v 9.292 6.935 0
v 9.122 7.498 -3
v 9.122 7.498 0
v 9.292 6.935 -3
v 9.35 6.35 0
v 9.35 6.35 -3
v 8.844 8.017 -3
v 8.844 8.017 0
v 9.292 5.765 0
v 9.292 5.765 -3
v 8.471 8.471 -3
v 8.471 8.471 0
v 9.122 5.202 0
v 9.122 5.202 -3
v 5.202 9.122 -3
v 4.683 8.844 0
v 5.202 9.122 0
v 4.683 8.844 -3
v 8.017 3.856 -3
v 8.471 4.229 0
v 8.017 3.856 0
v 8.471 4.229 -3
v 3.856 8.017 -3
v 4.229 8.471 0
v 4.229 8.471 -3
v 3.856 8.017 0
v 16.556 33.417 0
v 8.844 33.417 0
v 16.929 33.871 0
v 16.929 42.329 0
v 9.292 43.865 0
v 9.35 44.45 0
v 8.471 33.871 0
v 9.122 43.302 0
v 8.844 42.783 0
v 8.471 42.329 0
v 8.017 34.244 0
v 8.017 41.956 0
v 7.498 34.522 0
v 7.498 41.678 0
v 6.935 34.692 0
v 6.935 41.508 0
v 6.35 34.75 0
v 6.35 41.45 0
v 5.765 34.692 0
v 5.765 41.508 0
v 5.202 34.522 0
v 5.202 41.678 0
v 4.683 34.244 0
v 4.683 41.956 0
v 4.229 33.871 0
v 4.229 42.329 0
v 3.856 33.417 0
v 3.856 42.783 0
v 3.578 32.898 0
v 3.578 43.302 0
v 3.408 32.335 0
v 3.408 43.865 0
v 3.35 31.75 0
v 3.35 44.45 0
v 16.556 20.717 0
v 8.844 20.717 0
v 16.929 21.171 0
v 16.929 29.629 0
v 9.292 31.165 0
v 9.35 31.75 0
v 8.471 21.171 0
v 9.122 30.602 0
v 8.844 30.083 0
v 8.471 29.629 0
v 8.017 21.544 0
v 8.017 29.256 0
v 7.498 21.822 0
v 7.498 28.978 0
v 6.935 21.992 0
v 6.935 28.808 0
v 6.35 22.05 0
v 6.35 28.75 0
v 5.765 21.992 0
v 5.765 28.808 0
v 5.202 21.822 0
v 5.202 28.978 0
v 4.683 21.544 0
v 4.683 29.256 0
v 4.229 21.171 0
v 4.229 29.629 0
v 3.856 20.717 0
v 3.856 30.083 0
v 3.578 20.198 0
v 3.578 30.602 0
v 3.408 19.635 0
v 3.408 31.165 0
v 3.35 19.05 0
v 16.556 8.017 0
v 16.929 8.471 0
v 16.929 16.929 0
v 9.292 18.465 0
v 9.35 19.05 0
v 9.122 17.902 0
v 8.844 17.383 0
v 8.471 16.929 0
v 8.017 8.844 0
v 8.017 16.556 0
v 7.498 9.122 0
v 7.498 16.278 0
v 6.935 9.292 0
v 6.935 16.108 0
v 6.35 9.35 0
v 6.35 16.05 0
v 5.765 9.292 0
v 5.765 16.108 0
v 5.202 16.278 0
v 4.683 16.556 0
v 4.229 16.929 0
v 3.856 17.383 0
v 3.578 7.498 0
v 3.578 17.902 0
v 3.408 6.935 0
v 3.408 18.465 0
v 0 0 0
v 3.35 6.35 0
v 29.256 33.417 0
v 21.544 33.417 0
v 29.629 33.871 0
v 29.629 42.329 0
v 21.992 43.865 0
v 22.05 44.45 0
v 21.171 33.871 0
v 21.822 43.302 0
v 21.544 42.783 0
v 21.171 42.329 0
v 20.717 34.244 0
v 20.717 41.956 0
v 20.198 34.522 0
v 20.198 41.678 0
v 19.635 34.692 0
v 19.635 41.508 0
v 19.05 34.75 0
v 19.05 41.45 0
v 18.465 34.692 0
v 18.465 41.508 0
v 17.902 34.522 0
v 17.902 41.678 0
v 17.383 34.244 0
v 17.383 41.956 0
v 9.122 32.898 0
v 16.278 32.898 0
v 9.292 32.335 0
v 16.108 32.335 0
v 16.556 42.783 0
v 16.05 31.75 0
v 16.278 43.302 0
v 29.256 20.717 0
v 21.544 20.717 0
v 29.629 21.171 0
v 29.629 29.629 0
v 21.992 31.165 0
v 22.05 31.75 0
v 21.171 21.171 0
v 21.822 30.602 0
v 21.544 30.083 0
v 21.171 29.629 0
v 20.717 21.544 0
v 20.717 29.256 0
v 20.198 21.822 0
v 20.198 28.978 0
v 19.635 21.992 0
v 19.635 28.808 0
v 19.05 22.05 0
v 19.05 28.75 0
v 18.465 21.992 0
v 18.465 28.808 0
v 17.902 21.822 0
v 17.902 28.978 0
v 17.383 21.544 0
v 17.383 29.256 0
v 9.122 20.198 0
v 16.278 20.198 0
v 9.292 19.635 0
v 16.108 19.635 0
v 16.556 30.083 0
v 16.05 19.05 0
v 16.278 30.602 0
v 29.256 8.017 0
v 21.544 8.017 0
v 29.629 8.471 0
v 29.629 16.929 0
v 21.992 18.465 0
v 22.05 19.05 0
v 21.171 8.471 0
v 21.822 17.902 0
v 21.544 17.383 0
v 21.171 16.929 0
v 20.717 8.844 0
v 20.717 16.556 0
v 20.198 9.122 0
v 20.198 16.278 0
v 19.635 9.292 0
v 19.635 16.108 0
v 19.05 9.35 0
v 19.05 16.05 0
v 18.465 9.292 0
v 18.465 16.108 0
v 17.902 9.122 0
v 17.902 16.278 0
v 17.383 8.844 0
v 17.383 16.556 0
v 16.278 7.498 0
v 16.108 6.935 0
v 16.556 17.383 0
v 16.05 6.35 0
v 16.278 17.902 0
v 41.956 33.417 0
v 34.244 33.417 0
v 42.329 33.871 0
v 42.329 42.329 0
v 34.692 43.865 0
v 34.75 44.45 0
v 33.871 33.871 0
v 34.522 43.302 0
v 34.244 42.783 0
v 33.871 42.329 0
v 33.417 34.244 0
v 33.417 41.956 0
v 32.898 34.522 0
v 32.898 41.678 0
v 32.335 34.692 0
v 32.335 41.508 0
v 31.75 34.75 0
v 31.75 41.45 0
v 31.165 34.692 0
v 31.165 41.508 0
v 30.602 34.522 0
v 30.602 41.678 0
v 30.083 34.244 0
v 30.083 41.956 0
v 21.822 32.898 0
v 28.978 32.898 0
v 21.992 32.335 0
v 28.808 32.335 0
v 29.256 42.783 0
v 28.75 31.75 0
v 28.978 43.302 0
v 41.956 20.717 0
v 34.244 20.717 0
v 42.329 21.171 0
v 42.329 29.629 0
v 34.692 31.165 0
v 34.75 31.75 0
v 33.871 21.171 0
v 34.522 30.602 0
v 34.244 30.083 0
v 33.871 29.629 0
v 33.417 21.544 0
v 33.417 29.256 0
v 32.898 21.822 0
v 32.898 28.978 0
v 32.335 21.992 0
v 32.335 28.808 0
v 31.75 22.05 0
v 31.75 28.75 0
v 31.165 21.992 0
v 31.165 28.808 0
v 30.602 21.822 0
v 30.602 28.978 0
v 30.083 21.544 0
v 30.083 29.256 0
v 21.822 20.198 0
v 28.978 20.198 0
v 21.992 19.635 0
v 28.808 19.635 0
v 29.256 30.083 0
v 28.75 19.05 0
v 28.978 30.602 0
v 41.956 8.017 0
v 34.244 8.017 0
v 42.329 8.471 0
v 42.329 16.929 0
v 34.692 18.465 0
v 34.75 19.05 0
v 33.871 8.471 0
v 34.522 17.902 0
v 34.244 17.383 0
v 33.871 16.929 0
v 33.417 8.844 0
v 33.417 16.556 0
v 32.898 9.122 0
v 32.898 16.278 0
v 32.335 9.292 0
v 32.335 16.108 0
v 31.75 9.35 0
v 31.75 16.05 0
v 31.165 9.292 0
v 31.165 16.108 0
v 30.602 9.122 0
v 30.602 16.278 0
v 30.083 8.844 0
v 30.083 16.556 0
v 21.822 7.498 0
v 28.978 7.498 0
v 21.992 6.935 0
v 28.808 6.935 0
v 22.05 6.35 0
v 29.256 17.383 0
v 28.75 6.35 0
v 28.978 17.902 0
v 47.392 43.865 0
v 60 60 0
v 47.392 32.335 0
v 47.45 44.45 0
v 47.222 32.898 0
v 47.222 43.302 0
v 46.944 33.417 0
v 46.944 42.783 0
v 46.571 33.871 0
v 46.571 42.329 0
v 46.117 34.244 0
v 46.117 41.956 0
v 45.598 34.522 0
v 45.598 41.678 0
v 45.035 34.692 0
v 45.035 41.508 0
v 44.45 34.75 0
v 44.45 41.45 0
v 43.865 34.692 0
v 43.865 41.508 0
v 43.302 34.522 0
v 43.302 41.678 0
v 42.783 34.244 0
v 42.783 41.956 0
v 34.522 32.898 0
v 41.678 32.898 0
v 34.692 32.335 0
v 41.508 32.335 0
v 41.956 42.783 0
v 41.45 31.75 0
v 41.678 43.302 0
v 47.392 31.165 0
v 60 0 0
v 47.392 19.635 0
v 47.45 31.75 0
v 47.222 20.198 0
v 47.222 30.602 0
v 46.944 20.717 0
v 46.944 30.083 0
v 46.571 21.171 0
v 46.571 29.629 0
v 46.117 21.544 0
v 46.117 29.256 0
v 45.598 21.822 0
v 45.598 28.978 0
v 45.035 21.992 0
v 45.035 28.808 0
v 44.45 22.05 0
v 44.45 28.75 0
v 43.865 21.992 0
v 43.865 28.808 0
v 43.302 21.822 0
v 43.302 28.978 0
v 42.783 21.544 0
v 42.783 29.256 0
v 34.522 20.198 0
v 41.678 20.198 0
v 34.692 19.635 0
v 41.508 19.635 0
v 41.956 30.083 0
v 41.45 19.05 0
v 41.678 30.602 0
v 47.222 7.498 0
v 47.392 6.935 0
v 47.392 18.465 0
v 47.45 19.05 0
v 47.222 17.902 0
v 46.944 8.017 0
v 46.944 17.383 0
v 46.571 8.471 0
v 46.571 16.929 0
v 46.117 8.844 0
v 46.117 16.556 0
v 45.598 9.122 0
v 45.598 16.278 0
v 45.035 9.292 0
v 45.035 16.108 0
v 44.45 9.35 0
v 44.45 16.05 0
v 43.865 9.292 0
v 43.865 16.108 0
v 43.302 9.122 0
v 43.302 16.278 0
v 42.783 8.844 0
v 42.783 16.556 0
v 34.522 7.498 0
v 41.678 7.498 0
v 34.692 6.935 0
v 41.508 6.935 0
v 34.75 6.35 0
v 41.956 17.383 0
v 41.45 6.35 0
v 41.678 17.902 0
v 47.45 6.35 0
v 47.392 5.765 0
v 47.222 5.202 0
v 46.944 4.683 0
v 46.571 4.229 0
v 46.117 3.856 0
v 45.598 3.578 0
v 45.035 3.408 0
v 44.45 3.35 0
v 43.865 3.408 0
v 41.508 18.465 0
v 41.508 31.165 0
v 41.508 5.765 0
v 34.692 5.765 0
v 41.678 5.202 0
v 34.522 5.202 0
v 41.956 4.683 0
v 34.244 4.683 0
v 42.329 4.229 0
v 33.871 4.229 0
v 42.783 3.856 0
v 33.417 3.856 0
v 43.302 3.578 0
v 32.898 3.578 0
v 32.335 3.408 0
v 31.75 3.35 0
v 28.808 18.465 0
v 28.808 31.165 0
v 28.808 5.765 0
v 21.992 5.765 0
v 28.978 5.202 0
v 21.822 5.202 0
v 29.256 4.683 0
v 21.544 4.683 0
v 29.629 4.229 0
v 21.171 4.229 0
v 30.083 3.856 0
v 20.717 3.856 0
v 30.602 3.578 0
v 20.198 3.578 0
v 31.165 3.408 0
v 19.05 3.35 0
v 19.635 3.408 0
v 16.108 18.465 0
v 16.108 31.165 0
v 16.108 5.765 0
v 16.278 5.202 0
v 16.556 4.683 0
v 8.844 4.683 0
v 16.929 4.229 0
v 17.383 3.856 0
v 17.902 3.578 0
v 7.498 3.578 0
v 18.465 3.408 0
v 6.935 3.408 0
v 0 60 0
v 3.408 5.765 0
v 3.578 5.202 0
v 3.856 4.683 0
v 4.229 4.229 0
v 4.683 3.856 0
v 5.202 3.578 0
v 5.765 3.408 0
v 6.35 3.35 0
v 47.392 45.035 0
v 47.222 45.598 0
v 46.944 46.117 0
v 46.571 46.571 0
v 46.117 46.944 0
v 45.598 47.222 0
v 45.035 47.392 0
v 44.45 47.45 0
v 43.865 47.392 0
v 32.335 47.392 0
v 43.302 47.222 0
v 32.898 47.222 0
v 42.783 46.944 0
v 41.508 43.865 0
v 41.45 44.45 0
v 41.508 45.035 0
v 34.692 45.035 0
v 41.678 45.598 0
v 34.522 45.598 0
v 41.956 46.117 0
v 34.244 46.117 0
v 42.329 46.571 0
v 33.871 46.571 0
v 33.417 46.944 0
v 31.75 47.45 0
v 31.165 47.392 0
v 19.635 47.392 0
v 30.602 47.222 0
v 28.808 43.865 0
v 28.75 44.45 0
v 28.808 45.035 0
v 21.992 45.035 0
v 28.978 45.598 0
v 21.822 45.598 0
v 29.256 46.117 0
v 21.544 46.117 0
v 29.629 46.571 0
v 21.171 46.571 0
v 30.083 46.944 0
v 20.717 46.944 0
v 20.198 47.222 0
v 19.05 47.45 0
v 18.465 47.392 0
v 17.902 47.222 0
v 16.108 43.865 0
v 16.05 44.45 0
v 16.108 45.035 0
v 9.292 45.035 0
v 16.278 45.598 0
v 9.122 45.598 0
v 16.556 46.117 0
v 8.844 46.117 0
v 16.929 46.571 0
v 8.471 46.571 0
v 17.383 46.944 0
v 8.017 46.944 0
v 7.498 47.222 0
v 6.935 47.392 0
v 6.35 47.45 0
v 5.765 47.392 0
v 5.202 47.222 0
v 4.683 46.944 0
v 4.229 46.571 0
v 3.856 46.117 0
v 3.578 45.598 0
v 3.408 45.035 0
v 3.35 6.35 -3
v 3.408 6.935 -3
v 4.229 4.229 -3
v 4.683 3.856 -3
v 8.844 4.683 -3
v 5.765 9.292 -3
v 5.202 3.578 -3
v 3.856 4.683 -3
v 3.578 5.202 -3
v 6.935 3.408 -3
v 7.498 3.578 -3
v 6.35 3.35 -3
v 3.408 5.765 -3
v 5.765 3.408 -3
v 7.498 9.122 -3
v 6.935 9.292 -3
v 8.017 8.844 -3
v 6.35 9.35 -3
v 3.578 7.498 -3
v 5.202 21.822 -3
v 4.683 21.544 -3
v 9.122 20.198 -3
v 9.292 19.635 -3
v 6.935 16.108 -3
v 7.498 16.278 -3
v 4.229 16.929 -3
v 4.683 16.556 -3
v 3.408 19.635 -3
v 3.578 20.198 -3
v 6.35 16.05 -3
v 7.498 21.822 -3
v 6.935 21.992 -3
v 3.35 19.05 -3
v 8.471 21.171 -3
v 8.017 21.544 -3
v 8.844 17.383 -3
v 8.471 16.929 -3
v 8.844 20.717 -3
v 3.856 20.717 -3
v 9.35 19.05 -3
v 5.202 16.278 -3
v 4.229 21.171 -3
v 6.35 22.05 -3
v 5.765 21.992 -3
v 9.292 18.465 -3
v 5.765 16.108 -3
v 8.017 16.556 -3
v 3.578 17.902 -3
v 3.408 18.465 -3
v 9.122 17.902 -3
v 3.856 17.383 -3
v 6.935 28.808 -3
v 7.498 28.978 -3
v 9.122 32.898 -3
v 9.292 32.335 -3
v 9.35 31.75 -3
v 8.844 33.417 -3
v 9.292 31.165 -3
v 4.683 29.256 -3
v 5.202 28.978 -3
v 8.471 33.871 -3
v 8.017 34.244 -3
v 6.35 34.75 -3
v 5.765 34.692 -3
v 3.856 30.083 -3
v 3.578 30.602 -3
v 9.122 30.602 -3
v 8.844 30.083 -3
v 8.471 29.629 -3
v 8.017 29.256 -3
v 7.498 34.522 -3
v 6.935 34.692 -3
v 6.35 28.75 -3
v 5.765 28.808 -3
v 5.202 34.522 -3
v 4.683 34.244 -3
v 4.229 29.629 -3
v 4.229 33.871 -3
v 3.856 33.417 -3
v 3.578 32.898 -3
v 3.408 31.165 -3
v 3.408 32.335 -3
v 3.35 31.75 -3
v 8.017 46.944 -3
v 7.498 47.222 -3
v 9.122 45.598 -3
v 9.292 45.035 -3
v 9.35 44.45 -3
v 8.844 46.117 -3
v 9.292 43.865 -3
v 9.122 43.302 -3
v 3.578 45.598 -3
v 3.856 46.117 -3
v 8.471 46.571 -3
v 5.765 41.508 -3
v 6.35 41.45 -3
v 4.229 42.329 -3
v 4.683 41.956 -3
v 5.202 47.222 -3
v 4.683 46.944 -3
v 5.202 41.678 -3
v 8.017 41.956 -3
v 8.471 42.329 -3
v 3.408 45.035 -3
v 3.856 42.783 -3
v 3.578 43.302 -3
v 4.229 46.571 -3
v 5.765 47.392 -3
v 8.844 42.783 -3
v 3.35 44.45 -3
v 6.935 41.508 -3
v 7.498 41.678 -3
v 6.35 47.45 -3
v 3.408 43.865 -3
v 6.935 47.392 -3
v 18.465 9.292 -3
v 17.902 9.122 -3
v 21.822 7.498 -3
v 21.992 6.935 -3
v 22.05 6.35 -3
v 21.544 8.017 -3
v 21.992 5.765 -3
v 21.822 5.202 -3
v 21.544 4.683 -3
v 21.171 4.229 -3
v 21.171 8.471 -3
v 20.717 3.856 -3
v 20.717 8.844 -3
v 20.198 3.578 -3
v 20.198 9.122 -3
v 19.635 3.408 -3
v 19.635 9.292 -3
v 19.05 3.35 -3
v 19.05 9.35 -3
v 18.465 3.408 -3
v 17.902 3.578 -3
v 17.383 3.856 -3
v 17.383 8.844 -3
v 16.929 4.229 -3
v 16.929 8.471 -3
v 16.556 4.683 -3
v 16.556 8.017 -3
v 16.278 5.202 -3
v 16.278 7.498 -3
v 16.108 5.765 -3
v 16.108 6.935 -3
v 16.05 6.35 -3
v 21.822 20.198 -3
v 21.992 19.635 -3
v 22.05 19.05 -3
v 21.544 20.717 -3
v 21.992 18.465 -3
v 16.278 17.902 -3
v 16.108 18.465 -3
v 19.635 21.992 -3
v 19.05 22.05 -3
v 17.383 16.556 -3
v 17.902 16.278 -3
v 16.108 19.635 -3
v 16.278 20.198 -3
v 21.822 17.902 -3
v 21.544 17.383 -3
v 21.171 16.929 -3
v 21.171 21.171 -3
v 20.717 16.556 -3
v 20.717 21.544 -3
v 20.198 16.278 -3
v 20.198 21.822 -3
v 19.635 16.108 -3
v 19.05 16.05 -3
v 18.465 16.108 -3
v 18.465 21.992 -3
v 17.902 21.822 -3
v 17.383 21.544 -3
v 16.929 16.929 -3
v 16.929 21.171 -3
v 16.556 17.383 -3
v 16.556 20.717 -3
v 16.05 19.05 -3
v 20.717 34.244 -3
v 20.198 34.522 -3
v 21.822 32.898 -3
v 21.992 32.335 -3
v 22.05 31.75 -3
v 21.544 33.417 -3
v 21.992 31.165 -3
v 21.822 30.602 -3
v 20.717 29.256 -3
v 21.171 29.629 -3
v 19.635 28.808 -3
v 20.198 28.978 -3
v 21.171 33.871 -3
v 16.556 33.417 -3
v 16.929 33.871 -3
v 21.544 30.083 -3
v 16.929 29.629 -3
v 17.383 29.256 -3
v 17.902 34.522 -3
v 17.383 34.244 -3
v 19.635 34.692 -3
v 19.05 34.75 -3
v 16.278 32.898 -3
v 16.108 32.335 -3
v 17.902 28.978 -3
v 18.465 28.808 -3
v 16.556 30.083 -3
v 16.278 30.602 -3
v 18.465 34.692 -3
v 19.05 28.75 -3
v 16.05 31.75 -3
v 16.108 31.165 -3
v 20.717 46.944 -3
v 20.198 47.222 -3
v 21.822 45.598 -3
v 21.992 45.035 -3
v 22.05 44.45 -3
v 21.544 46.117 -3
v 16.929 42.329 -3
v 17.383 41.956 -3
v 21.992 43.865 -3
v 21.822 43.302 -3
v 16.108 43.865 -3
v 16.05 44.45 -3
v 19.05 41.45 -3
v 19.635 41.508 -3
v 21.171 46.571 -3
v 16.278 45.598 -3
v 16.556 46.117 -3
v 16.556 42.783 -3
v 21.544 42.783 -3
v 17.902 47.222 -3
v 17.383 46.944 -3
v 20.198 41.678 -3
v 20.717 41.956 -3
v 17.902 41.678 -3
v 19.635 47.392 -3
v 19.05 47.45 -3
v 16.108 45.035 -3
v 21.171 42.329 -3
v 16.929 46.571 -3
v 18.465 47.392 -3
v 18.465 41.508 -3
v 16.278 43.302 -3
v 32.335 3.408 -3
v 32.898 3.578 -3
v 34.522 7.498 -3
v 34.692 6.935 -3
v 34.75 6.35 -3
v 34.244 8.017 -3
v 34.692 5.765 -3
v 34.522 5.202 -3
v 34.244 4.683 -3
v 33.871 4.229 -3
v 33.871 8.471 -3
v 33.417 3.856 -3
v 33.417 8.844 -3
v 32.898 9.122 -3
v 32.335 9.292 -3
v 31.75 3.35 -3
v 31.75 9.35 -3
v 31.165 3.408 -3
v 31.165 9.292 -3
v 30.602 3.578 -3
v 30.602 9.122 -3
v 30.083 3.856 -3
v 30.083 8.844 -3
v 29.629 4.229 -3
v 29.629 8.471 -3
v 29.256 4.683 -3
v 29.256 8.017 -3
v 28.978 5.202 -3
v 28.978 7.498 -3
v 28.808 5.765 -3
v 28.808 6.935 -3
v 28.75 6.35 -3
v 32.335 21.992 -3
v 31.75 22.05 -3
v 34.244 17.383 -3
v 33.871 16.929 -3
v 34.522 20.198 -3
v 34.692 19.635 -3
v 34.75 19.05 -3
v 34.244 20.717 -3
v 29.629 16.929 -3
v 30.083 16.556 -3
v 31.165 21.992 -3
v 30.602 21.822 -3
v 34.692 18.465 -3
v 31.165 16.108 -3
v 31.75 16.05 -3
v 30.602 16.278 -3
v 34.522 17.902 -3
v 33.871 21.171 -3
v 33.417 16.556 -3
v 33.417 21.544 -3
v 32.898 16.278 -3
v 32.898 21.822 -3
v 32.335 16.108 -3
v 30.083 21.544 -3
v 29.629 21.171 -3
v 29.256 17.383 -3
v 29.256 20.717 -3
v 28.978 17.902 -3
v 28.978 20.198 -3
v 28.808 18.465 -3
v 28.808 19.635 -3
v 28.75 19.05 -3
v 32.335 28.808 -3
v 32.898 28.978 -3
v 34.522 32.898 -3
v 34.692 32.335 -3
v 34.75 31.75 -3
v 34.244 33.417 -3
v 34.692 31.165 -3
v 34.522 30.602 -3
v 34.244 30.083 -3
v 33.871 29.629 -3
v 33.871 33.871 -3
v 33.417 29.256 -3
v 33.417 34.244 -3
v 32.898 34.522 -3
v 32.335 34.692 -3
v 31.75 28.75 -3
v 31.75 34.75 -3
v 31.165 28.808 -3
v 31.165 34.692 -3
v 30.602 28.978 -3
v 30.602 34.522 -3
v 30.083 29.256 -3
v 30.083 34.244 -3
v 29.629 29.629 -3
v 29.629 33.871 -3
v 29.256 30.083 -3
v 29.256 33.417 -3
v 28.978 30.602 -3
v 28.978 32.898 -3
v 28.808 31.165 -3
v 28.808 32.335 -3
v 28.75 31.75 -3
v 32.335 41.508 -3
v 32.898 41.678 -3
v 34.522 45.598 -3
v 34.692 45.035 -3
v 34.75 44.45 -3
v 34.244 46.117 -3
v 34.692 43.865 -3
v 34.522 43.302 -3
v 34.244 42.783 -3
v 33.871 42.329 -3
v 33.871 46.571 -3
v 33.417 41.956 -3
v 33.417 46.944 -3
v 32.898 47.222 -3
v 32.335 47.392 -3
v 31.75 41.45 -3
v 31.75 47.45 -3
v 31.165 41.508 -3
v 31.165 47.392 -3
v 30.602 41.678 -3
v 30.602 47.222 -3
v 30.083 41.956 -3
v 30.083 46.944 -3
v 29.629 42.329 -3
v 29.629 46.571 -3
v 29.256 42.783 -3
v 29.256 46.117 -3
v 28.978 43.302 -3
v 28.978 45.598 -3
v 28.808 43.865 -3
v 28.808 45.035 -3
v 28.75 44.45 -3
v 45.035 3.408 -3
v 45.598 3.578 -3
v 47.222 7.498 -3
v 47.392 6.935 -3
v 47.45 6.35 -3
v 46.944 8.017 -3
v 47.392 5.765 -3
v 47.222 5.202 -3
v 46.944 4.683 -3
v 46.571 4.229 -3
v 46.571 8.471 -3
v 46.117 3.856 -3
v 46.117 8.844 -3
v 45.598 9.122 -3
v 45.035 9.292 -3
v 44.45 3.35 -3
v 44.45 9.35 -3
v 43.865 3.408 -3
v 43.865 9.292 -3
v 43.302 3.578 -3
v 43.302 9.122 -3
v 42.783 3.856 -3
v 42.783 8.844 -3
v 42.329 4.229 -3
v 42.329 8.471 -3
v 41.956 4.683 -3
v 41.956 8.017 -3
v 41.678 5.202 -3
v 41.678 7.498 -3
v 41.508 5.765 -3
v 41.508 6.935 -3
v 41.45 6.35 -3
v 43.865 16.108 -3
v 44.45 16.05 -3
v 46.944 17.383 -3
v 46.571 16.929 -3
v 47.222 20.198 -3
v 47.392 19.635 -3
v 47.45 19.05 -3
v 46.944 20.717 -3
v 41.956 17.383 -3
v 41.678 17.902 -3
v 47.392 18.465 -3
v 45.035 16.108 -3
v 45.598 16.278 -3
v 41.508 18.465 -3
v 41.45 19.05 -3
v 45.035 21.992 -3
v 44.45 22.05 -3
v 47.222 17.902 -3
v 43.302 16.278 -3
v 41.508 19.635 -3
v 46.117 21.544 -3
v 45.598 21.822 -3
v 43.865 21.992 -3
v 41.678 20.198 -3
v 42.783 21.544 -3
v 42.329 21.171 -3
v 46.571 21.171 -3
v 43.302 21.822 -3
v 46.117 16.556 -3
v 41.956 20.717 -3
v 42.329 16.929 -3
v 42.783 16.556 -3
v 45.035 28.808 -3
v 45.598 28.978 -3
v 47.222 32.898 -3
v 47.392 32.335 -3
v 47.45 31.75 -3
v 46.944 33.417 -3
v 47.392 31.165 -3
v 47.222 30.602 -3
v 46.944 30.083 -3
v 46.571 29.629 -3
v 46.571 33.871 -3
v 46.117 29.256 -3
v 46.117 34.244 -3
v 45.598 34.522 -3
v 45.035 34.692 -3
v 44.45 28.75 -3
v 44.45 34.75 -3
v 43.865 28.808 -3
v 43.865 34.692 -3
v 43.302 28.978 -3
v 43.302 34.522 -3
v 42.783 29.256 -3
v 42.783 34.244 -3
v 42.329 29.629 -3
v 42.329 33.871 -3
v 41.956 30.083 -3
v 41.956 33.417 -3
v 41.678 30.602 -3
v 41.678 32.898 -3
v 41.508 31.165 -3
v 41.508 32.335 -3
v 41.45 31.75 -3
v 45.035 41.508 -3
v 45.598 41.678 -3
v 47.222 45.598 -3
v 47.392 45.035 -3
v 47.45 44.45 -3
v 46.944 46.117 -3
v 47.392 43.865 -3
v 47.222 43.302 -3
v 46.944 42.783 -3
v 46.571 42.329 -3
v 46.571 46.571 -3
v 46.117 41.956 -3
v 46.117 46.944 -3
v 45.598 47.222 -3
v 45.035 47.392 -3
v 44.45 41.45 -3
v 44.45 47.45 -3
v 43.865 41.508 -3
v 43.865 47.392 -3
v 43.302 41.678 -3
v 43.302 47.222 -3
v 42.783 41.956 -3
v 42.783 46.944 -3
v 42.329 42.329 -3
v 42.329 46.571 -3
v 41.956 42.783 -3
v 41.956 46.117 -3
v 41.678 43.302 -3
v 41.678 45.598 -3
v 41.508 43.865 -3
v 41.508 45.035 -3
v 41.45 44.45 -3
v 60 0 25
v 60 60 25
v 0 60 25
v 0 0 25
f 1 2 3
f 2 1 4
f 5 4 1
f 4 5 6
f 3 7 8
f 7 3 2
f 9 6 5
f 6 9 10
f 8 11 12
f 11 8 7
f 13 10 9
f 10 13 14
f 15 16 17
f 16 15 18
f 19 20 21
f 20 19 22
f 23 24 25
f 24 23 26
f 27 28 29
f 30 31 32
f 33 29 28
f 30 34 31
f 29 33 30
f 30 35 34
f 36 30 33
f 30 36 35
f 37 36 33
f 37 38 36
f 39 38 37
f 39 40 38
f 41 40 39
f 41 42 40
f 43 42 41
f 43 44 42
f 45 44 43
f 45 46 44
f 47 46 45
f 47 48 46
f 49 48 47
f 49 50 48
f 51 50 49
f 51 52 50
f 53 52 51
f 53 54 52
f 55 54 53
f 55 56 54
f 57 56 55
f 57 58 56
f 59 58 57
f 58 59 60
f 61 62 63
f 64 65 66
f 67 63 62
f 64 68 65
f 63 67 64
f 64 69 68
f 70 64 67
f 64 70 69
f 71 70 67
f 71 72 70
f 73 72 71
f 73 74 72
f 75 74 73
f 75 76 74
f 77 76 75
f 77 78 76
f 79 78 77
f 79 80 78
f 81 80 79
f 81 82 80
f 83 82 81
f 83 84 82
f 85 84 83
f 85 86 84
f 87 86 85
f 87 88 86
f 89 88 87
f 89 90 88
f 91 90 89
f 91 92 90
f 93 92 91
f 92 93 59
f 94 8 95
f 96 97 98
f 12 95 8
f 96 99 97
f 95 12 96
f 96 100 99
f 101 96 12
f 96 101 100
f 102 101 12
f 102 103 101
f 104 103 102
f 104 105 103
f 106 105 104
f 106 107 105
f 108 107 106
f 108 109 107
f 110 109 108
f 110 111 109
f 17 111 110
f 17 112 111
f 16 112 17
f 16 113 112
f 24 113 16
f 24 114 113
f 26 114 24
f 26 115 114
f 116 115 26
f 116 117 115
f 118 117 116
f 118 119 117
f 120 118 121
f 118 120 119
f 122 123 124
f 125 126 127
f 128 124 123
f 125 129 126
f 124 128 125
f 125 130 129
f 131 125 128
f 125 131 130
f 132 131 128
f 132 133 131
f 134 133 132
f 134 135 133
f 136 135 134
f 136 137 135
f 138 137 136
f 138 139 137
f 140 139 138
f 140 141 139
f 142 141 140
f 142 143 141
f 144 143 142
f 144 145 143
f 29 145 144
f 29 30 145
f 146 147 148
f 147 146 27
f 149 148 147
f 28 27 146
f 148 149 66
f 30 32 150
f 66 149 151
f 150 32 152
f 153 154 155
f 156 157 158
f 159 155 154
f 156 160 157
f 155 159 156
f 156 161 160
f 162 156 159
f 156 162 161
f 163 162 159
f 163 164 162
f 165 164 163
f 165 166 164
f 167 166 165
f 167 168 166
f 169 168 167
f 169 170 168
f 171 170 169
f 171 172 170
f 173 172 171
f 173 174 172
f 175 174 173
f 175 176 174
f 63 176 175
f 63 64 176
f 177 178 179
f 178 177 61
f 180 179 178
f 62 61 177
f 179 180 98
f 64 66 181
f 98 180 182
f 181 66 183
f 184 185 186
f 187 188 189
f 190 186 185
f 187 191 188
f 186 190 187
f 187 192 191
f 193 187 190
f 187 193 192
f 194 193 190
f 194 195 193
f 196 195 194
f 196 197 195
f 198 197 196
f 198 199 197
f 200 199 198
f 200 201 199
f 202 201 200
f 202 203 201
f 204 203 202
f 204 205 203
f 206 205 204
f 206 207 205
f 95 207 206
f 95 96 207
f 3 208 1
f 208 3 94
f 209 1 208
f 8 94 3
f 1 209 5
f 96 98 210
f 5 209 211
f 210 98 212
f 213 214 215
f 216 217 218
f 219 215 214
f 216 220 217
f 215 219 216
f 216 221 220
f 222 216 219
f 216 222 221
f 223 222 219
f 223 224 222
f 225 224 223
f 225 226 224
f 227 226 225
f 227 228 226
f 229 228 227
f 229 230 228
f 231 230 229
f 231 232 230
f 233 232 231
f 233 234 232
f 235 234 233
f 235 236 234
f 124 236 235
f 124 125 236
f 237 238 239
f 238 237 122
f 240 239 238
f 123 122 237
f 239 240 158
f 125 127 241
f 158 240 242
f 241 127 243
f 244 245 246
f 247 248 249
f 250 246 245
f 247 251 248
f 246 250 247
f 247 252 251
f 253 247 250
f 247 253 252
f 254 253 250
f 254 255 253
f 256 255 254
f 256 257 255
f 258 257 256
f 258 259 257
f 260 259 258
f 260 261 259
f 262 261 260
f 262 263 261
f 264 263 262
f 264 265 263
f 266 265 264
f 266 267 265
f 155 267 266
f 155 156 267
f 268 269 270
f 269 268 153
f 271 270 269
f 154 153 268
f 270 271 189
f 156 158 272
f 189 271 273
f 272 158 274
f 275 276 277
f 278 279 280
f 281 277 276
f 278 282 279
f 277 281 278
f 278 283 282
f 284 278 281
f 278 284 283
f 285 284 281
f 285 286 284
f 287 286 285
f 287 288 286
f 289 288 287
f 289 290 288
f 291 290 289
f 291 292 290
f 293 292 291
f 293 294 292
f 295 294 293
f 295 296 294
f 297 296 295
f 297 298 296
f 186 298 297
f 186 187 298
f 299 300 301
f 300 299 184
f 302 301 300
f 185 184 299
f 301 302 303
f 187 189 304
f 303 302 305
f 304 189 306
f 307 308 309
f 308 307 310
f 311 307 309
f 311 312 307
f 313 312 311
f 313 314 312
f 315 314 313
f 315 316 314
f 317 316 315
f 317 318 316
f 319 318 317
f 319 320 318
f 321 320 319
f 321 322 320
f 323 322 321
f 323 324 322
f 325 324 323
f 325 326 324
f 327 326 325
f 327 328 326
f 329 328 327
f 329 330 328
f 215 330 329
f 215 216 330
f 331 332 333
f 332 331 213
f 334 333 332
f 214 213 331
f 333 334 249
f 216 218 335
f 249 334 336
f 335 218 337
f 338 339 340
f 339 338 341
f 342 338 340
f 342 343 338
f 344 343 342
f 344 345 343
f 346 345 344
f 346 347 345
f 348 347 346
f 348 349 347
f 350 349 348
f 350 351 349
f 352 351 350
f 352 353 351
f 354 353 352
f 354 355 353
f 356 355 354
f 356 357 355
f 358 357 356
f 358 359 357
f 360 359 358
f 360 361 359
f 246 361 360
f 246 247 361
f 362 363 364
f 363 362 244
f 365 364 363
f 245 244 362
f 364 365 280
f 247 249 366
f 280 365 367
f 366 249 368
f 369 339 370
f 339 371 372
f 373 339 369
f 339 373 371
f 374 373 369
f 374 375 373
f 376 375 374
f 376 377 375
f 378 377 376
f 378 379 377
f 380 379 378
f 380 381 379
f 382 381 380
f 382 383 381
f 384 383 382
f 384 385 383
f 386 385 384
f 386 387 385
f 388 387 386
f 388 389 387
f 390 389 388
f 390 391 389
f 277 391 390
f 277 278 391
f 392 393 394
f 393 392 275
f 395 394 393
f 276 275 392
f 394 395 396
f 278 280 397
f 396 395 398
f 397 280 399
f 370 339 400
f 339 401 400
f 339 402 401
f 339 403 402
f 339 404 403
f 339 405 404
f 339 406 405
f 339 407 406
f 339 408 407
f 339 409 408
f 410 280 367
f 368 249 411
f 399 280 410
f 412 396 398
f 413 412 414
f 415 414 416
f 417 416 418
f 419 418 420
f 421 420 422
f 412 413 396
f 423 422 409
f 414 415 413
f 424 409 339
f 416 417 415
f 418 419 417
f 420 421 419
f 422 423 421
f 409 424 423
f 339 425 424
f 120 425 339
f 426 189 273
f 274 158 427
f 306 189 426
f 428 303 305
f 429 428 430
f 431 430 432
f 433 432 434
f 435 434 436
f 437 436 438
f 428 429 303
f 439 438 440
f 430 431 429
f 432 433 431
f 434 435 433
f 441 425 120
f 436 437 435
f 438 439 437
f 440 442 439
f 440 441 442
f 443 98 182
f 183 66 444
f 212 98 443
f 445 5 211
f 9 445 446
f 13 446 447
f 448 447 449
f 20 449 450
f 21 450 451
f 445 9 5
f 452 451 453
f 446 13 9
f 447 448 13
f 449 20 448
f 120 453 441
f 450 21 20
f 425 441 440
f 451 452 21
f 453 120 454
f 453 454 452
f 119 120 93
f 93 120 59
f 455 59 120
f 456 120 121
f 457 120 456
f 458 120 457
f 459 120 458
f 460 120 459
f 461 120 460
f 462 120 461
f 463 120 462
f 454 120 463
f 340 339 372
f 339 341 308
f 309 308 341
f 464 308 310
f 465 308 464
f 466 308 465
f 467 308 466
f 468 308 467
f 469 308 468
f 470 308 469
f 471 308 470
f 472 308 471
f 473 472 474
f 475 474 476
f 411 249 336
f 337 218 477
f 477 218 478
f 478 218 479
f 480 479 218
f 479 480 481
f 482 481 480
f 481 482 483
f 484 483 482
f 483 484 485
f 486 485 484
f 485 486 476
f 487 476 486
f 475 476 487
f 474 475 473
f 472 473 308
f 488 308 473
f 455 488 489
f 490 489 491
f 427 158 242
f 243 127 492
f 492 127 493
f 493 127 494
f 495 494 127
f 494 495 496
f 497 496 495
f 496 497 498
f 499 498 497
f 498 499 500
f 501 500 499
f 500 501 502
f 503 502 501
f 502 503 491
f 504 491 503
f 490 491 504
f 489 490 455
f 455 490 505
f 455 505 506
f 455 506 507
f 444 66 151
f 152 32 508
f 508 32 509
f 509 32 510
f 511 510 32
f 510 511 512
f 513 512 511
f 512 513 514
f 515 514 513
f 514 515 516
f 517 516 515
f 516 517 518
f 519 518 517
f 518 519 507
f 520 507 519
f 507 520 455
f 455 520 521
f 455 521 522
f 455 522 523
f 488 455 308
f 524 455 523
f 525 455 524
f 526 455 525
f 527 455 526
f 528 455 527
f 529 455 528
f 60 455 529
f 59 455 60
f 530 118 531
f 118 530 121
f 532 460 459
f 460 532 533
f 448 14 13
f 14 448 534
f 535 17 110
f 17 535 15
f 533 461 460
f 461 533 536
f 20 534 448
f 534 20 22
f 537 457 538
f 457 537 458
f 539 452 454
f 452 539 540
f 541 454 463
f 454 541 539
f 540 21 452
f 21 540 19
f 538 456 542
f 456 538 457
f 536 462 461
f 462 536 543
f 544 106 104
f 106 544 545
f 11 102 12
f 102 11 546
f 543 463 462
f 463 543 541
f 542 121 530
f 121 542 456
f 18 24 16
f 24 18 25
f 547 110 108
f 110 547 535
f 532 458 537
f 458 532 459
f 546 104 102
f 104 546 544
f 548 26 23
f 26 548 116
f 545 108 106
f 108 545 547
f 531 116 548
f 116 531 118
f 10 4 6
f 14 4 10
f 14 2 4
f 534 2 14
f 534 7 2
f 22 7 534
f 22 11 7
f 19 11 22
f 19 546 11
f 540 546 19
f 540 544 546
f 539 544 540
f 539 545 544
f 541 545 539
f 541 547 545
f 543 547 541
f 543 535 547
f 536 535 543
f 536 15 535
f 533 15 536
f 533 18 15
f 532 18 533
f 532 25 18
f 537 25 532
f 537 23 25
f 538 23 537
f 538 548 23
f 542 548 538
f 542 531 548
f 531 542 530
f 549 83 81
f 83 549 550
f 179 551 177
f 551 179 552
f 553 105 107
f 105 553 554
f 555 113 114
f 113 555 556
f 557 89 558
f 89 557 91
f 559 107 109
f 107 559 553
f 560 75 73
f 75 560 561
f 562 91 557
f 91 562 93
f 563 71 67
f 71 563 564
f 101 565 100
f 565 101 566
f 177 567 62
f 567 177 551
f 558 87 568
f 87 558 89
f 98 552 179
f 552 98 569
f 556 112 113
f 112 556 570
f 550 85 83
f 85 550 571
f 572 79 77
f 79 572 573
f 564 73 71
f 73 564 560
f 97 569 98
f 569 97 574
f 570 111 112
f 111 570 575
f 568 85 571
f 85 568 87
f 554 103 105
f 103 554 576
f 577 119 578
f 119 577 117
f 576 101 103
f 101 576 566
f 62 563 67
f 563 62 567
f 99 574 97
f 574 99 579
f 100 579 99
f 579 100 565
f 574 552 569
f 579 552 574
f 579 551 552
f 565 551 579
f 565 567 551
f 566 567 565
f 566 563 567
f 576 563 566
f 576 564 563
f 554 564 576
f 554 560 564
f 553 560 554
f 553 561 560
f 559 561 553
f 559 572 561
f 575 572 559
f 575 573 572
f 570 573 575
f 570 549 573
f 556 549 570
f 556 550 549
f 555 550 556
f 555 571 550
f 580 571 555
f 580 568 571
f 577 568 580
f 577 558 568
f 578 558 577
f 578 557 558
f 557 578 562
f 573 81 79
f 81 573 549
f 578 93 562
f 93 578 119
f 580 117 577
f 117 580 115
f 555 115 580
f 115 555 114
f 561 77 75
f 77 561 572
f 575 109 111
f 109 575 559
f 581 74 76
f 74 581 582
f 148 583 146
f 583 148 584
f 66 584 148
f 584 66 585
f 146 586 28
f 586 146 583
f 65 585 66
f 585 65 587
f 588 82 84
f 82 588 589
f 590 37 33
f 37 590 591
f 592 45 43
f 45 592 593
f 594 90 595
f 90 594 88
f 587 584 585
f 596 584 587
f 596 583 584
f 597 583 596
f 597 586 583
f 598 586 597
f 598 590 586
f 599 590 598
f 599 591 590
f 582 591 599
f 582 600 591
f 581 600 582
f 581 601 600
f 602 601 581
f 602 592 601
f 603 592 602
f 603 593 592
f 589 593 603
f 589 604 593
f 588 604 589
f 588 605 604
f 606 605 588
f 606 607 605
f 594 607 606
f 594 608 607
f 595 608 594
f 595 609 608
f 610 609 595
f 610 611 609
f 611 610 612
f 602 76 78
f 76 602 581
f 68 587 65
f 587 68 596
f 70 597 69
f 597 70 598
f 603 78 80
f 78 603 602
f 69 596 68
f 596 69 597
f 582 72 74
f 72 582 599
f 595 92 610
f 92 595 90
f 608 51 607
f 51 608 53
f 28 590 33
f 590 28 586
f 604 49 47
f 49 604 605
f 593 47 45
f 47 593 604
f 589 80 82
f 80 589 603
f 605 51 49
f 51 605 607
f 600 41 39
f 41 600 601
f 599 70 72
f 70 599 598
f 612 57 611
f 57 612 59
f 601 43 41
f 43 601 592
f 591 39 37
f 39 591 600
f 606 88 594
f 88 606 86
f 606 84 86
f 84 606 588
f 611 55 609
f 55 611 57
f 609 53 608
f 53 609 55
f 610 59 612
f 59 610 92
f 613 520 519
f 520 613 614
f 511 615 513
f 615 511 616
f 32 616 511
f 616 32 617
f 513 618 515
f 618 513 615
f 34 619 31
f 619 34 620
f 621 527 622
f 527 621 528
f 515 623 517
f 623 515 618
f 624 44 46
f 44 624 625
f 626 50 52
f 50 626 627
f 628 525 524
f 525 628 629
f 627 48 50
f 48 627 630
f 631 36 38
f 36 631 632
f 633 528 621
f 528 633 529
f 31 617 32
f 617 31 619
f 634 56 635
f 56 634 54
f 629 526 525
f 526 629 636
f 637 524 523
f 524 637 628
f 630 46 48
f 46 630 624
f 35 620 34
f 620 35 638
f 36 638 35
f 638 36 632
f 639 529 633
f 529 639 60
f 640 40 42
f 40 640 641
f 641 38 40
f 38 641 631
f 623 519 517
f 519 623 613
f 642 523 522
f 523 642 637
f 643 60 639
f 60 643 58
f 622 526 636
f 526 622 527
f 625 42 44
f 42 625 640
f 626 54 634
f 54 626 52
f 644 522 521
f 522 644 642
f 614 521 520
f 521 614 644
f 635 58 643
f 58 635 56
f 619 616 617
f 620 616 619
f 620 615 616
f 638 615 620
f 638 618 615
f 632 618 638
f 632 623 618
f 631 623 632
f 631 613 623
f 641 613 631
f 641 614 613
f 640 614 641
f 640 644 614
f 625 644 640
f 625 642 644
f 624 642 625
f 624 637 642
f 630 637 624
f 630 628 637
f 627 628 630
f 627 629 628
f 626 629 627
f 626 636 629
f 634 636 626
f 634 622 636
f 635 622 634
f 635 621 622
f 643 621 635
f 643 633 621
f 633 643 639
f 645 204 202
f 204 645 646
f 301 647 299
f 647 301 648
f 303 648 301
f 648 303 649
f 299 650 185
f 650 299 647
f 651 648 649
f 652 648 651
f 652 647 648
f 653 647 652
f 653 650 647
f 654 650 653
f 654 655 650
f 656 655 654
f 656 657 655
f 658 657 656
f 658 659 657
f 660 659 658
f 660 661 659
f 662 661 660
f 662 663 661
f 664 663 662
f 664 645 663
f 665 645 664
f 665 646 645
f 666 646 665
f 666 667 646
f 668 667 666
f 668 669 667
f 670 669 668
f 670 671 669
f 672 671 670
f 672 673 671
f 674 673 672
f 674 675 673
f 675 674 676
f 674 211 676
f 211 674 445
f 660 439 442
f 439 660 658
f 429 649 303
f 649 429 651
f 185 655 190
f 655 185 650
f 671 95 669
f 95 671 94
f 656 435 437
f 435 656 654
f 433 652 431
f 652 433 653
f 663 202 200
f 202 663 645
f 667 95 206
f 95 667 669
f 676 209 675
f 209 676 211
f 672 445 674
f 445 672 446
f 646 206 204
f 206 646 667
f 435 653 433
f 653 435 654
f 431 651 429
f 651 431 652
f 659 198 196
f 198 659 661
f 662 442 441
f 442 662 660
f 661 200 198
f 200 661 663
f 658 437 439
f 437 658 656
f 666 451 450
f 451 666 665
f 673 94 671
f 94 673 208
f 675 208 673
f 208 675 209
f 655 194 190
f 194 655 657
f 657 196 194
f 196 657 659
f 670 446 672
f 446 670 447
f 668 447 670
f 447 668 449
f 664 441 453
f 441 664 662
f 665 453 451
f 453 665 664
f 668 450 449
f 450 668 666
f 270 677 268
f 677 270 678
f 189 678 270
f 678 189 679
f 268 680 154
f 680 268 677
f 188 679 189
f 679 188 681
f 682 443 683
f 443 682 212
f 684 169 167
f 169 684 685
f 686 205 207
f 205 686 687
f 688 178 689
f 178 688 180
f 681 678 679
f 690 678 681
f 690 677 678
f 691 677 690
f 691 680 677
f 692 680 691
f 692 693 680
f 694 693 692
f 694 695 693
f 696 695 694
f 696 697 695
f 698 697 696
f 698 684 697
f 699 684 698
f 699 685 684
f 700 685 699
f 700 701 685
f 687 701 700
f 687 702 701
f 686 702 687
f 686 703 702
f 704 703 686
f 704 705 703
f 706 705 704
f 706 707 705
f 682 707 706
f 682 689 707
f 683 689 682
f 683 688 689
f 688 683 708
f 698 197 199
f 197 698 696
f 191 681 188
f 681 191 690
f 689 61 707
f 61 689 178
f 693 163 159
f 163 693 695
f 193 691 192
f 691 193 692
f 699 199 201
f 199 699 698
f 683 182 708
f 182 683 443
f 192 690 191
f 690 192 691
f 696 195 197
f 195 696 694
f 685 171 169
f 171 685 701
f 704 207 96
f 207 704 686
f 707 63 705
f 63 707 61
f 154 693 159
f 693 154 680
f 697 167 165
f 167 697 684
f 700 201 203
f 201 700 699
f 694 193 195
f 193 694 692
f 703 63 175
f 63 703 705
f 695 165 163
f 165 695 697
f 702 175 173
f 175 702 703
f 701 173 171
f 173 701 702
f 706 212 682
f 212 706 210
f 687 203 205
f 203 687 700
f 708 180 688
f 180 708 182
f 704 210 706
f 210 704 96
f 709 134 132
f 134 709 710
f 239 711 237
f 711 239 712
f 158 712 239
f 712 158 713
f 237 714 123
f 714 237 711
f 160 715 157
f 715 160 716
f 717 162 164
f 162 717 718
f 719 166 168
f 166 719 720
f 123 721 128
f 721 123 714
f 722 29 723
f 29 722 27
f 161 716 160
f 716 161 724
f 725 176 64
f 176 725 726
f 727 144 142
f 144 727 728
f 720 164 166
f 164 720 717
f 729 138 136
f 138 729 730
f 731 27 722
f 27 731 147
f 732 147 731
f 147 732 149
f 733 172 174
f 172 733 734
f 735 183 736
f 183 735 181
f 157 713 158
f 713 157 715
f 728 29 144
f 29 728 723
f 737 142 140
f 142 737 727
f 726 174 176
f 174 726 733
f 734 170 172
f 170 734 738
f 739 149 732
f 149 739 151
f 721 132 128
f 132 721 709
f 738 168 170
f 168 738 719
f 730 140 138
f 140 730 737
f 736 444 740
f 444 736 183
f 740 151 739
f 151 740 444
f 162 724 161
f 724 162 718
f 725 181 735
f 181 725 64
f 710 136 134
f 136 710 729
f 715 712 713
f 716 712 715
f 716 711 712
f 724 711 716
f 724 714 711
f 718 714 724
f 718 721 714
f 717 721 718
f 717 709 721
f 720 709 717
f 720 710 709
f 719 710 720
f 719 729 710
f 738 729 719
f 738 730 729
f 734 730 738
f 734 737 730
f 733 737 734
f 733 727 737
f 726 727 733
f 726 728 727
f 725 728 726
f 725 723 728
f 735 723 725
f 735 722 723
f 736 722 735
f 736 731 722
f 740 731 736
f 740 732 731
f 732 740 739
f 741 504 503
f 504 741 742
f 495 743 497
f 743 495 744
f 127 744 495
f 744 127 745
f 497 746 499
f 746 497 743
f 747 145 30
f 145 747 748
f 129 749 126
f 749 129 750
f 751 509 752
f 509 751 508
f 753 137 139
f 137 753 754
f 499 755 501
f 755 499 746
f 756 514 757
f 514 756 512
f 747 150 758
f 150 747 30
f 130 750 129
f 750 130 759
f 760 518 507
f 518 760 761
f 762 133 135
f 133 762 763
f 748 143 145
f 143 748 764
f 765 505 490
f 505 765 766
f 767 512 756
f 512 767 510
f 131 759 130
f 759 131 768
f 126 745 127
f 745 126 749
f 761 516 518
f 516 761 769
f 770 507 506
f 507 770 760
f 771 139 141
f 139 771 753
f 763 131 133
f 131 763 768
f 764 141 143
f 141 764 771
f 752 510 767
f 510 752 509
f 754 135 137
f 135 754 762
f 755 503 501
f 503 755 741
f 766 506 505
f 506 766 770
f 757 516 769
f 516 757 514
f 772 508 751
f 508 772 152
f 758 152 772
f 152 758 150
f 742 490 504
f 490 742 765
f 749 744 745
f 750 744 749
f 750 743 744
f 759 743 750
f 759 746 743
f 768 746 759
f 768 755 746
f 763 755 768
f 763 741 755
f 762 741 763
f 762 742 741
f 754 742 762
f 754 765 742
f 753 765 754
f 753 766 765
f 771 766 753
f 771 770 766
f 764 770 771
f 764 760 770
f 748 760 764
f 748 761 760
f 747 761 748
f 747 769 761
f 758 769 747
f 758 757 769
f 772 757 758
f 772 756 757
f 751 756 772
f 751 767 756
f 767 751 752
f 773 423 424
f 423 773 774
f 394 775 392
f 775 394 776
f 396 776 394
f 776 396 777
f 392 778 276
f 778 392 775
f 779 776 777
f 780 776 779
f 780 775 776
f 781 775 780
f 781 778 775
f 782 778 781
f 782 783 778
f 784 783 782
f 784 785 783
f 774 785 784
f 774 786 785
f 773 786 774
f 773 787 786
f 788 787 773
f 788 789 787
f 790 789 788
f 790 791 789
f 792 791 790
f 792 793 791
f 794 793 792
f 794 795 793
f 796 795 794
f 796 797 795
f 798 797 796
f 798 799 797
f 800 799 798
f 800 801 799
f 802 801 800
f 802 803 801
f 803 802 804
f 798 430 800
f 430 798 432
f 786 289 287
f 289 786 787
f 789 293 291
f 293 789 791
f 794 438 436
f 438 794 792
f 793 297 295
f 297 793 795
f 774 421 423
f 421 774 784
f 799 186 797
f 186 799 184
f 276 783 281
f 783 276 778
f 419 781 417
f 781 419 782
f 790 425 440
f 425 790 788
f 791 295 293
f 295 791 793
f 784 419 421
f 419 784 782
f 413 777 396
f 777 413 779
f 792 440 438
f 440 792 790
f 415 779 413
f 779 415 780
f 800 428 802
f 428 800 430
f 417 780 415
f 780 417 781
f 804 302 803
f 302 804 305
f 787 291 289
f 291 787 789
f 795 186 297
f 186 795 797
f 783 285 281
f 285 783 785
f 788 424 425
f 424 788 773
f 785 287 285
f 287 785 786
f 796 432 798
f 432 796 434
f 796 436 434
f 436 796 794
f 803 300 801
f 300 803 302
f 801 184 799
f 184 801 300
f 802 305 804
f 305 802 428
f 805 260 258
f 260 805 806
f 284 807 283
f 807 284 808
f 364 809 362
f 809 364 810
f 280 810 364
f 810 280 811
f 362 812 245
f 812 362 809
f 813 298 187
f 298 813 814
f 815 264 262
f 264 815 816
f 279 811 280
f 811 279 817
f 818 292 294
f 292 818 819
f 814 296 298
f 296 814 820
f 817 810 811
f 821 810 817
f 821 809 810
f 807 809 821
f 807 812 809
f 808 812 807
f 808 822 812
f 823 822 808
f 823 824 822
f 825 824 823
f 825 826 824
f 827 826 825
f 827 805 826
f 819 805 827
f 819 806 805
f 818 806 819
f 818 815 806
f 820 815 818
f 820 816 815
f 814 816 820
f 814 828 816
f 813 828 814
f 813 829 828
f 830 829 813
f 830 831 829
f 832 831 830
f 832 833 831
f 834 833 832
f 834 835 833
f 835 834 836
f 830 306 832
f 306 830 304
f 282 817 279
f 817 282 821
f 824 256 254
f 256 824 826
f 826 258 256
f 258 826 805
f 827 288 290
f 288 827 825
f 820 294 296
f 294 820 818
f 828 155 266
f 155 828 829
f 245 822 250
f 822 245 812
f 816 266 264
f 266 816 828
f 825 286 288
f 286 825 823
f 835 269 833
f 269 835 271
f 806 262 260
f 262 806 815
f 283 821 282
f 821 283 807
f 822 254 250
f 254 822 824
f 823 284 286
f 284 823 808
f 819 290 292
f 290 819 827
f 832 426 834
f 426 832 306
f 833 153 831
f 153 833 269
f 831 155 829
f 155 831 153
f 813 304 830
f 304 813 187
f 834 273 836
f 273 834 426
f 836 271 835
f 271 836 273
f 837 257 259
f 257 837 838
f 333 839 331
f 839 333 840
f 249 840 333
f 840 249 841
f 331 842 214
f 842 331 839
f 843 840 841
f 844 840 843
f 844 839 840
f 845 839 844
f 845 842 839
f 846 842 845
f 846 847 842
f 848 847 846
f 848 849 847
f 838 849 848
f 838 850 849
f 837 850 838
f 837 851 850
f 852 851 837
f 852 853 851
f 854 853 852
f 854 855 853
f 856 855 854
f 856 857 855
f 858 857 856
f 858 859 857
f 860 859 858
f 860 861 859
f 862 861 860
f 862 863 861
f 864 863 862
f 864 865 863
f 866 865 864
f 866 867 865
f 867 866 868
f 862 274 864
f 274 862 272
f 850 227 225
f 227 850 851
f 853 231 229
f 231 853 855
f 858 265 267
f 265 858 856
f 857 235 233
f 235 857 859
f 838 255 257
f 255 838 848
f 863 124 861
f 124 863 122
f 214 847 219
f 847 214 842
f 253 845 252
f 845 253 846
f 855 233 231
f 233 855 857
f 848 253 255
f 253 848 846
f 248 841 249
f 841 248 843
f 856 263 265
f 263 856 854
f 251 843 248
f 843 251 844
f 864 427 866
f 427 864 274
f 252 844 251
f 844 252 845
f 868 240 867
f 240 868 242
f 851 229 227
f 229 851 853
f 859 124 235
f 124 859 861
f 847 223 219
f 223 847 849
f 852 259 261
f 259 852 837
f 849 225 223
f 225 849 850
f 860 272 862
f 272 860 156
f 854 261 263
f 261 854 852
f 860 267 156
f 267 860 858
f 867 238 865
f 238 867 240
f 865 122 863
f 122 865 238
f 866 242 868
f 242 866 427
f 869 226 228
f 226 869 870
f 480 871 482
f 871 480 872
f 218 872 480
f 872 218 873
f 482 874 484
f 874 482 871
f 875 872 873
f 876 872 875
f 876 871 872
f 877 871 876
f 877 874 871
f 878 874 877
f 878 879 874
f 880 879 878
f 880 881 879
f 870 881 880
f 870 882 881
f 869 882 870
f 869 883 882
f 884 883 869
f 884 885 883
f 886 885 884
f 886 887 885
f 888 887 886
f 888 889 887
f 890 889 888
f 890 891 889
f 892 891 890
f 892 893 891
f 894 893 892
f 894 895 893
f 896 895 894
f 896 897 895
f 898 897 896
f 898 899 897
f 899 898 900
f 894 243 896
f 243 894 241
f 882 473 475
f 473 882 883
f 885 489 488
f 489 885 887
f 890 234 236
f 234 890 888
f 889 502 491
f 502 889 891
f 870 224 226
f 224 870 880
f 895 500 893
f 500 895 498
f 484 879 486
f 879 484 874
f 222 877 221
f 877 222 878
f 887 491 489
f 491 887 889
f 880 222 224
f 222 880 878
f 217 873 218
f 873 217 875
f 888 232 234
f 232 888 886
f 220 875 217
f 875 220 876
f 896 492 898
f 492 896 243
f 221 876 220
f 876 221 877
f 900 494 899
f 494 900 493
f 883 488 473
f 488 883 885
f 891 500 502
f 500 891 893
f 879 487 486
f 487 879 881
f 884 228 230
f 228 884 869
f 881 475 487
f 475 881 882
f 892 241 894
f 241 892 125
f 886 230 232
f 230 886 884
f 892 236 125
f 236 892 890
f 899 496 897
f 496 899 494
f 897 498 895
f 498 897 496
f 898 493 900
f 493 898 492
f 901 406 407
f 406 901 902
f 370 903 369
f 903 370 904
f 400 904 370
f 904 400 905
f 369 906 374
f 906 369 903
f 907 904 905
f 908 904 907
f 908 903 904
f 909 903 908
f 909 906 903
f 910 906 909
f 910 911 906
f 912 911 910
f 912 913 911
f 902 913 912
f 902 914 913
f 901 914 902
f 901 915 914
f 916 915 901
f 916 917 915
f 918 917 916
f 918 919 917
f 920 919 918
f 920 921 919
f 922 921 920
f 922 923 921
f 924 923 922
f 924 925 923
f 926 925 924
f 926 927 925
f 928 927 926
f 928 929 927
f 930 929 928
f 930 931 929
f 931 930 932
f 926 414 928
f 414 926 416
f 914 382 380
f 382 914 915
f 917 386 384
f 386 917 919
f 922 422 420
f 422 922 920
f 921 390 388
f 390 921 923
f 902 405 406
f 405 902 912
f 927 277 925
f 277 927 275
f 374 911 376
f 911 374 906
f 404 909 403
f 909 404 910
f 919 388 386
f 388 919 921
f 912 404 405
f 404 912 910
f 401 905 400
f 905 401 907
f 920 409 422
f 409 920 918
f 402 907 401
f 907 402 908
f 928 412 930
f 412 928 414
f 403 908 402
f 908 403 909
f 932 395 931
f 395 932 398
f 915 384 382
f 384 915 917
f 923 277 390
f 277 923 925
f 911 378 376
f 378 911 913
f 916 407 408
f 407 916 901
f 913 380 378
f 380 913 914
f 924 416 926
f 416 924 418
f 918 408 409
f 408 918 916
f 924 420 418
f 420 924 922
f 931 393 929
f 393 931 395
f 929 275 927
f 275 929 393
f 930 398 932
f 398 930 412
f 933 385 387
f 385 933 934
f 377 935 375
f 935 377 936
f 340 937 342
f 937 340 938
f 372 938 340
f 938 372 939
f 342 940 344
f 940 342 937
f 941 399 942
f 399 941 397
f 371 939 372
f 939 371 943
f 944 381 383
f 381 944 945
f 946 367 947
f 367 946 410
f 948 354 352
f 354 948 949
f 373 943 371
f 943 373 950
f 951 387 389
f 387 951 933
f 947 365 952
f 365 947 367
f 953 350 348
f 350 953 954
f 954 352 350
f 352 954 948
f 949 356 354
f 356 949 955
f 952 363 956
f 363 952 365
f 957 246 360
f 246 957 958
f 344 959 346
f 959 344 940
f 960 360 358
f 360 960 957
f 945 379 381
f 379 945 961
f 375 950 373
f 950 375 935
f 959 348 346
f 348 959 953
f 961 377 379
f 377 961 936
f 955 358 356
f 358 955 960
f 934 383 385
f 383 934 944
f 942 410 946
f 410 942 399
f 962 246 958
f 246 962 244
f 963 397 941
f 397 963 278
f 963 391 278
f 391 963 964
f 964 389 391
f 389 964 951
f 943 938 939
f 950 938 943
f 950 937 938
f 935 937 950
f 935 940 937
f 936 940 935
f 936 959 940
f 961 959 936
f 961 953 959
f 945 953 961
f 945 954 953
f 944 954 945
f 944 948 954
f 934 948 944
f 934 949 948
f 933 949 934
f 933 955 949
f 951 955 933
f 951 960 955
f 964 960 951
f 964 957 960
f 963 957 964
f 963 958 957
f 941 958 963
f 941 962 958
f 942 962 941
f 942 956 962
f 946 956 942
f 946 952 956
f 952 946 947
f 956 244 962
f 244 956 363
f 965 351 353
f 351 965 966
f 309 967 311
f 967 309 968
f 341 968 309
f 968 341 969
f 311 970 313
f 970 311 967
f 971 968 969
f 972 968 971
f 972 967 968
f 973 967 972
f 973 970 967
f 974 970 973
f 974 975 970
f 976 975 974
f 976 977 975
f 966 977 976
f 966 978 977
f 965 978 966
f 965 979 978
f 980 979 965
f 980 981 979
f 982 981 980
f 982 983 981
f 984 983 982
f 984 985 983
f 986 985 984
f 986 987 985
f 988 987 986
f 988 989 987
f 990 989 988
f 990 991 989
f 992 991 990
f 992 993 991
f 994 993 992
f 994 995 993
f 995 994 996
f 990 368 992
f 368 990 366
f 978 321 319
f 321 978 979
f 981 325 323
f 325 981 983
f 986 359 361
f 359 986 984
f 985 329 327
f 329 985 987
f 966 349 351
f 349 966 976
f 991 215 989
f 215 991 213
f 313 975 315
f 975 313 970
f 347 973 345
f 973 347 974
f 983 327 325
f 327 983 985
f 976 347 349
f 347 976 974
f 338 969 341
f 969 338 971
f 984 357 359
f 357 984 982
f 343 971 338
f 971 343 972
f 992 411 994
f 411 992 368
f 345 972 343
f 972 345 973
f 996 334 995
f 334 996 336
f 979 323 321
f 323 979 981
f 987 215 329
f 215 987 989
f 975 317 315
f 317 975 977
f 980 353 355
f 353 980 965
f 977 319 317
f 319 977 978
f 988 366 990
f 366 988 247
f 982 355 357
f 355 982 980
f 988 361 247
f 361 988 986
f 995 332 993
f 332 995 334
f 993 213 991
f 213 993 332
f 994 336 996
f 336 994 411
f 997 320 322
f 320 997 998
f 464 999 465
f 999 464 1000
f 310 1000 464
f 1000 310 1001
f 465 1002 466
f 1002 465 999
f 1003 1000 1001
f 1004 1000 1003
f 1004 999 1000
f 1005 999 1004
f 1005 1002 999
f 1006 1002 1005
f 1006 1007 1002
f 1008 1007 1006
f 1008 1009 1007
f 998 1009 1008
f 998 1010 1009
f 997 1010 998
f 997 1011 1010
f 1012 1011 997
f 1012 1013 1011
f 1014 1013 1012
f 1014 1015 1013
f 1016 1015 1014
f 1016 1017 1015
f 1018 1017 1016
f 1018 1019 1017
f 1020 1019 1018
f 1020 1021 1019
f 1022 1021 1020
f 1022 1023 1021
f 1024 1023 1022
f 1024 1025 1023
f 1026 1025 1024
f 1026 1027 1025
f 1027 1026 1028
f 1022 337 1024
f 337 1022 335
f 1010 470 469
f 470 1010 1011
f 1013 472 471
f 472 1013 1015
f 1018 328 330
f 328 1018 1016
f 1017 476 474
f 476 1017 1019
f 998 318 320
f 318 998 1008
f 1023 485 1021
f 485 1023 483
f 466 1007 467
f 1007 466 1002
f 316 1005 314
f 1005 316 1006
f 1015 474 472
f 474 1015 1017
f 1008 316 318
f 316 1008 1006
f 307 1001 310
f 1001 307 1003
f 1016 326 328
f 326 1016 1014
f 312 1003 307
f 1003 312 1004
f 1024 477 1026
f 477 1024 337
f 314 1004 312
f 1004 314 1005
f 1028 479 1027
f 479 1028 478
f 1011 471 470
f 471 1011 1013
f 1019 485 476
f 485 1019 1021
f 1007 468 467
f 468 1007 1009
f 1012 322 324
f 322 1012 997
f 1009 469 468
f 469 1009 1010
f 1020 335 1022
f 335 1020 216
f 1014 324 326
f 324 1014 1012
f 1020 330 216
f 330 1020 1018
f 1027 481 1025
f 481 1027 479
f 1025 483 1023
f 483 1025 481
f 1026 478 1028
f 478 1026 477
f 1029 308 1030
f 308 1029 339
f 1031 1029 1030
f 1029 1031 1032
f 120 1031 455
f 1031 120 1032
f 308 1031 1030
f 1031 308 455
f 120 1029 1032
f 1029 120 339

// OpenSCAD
// file: ../lib/studs.scad
// Lego-inspired stud/socket pair for locking terrain onto baseplates.
// NOT Lego-compatible — sized for typical FDM print tolerance (0.4mm nozzle).
// Same params must be used on the baseplate (studs) and terrain (sockets).

include <units.scad>;

STUD_D = 6;             // stud outer diameter, mm
STUD_H = 3;             // stud height above baseplate top, mm
STUD_TOL = 0.4;         // diametrical clearance between stud and socket
SOCKET_DEPTH_PAD = 0.4; // extra depth so stud bottoms out cleanly

// 0.5"/0.25" grid: chosen so every baseplate dimension (2", 2.5", 4", 6", 7",
// 8", 10", 11.5") divides cleanly and produces a symmetric corner-anchored
// grid (6.35mm of edge material on all four sides of every baseplate).
// Also fits a 6mm-diameter stud inside a 10mm-thick wall (stud at Y=6.35
// extends Y=3.35-9.35, fully contained).
STUD_GRID_SPACING = 12.7; // 0.5"
STUD_GRID_MARGIN  = 6.35; // 0.25"

module stud(d=STUD_D, h=STUD_H) {
    cylinder(d=d, h=h, $fn=32);
}

module socket(d=STUD_D, h=STUD_H, tol=STUD_TOL) {
    translate([0, 0, -EPS])
        cylinder(d=d+tol, h=h+SOCKET_DEPTH_PAD+EPS, $fn=32);
}

// Corner-anchored grid: first stud at (margin, margin), then every `spacing` mm.
// Same anchor on every baseplate and terrain piece, so corner-aligned placement
// always lines up across any baseplate (including across split baseplate seams).
module stud_grid_rect(w, d, spacing=STUD_GRID_SPACING, margin=STUD_GRID_MARGIN,
                      stud_d=STUD_D, stud_h=STUD_H) {
    nx = max(1, floor((w - 2*margin) / spacing + 1e-6) + 1);
    ny = max(1, floor((d - 2*margin) / spacing + 1e-6) + 1);
    for (i = [0:nx-1], j = [0:ny-1])
        translate([margin + i*spacing, margin + j*spacing, 0])
            stud(d=stud_d, h=stud_h);
}

// Sockets matching stud_grid_rect with identical parameters.
// Subtract from the bottom of a terrain piece sitting at Z=0.
module socket_grid_rect(w, d, spacing=STUD_GRID_SPACING, margin=STUD_GRID_MARGIN,
                        stud_d=STUD_D, stud_h=STUD_H) {
    nx = max(1, floor((w - 2*margin) / spacing + 1e-6) + 1);
    ny = max(1, floor((d - 2*margin) / spacing + 1e-6) + 1);
    for (i = [0:nx-1], j = [0:ny-1])
        translate([margin + i*spacing, margin + j*spacing, 0])
            socket(d=stud_d, h=stud_h);
}
// file: ../lib/units.scad
// Shared units and constants for the 40k terrain project.

INCH = 25.4;
PRINTER_BED = 256; // mm — max single-piece dimension before splitting
EPS = 0.01;        // small offset for clean boolean operations

function inches(n) = n * INCH;
// main file
// Test block — a simple rectangular terrain piece with studs hanging from its
// underside. Validates the stud/hole lock system. The studs slot into the
// through-holes on any baseplate; the block's flat top is unused by the lock.
//
// Print orientation: studs-up is easiest (no overhangs). Flip in your slicer.

include <../lib/units.scad>;
include <../lib/studs.scad>;

W = 60; // block footprint X, mm
D = 60; // block footprint Y, mm
H = 25; // block height, mm

module test_block() {
    cube([W, D, H]);
    // Studs grow from z=-STUD_H up to z=0, flush with the block bottom.
    translate([0, 0, -STUD_H])
        stud_grid_rect(W, D);
}

test_block();
